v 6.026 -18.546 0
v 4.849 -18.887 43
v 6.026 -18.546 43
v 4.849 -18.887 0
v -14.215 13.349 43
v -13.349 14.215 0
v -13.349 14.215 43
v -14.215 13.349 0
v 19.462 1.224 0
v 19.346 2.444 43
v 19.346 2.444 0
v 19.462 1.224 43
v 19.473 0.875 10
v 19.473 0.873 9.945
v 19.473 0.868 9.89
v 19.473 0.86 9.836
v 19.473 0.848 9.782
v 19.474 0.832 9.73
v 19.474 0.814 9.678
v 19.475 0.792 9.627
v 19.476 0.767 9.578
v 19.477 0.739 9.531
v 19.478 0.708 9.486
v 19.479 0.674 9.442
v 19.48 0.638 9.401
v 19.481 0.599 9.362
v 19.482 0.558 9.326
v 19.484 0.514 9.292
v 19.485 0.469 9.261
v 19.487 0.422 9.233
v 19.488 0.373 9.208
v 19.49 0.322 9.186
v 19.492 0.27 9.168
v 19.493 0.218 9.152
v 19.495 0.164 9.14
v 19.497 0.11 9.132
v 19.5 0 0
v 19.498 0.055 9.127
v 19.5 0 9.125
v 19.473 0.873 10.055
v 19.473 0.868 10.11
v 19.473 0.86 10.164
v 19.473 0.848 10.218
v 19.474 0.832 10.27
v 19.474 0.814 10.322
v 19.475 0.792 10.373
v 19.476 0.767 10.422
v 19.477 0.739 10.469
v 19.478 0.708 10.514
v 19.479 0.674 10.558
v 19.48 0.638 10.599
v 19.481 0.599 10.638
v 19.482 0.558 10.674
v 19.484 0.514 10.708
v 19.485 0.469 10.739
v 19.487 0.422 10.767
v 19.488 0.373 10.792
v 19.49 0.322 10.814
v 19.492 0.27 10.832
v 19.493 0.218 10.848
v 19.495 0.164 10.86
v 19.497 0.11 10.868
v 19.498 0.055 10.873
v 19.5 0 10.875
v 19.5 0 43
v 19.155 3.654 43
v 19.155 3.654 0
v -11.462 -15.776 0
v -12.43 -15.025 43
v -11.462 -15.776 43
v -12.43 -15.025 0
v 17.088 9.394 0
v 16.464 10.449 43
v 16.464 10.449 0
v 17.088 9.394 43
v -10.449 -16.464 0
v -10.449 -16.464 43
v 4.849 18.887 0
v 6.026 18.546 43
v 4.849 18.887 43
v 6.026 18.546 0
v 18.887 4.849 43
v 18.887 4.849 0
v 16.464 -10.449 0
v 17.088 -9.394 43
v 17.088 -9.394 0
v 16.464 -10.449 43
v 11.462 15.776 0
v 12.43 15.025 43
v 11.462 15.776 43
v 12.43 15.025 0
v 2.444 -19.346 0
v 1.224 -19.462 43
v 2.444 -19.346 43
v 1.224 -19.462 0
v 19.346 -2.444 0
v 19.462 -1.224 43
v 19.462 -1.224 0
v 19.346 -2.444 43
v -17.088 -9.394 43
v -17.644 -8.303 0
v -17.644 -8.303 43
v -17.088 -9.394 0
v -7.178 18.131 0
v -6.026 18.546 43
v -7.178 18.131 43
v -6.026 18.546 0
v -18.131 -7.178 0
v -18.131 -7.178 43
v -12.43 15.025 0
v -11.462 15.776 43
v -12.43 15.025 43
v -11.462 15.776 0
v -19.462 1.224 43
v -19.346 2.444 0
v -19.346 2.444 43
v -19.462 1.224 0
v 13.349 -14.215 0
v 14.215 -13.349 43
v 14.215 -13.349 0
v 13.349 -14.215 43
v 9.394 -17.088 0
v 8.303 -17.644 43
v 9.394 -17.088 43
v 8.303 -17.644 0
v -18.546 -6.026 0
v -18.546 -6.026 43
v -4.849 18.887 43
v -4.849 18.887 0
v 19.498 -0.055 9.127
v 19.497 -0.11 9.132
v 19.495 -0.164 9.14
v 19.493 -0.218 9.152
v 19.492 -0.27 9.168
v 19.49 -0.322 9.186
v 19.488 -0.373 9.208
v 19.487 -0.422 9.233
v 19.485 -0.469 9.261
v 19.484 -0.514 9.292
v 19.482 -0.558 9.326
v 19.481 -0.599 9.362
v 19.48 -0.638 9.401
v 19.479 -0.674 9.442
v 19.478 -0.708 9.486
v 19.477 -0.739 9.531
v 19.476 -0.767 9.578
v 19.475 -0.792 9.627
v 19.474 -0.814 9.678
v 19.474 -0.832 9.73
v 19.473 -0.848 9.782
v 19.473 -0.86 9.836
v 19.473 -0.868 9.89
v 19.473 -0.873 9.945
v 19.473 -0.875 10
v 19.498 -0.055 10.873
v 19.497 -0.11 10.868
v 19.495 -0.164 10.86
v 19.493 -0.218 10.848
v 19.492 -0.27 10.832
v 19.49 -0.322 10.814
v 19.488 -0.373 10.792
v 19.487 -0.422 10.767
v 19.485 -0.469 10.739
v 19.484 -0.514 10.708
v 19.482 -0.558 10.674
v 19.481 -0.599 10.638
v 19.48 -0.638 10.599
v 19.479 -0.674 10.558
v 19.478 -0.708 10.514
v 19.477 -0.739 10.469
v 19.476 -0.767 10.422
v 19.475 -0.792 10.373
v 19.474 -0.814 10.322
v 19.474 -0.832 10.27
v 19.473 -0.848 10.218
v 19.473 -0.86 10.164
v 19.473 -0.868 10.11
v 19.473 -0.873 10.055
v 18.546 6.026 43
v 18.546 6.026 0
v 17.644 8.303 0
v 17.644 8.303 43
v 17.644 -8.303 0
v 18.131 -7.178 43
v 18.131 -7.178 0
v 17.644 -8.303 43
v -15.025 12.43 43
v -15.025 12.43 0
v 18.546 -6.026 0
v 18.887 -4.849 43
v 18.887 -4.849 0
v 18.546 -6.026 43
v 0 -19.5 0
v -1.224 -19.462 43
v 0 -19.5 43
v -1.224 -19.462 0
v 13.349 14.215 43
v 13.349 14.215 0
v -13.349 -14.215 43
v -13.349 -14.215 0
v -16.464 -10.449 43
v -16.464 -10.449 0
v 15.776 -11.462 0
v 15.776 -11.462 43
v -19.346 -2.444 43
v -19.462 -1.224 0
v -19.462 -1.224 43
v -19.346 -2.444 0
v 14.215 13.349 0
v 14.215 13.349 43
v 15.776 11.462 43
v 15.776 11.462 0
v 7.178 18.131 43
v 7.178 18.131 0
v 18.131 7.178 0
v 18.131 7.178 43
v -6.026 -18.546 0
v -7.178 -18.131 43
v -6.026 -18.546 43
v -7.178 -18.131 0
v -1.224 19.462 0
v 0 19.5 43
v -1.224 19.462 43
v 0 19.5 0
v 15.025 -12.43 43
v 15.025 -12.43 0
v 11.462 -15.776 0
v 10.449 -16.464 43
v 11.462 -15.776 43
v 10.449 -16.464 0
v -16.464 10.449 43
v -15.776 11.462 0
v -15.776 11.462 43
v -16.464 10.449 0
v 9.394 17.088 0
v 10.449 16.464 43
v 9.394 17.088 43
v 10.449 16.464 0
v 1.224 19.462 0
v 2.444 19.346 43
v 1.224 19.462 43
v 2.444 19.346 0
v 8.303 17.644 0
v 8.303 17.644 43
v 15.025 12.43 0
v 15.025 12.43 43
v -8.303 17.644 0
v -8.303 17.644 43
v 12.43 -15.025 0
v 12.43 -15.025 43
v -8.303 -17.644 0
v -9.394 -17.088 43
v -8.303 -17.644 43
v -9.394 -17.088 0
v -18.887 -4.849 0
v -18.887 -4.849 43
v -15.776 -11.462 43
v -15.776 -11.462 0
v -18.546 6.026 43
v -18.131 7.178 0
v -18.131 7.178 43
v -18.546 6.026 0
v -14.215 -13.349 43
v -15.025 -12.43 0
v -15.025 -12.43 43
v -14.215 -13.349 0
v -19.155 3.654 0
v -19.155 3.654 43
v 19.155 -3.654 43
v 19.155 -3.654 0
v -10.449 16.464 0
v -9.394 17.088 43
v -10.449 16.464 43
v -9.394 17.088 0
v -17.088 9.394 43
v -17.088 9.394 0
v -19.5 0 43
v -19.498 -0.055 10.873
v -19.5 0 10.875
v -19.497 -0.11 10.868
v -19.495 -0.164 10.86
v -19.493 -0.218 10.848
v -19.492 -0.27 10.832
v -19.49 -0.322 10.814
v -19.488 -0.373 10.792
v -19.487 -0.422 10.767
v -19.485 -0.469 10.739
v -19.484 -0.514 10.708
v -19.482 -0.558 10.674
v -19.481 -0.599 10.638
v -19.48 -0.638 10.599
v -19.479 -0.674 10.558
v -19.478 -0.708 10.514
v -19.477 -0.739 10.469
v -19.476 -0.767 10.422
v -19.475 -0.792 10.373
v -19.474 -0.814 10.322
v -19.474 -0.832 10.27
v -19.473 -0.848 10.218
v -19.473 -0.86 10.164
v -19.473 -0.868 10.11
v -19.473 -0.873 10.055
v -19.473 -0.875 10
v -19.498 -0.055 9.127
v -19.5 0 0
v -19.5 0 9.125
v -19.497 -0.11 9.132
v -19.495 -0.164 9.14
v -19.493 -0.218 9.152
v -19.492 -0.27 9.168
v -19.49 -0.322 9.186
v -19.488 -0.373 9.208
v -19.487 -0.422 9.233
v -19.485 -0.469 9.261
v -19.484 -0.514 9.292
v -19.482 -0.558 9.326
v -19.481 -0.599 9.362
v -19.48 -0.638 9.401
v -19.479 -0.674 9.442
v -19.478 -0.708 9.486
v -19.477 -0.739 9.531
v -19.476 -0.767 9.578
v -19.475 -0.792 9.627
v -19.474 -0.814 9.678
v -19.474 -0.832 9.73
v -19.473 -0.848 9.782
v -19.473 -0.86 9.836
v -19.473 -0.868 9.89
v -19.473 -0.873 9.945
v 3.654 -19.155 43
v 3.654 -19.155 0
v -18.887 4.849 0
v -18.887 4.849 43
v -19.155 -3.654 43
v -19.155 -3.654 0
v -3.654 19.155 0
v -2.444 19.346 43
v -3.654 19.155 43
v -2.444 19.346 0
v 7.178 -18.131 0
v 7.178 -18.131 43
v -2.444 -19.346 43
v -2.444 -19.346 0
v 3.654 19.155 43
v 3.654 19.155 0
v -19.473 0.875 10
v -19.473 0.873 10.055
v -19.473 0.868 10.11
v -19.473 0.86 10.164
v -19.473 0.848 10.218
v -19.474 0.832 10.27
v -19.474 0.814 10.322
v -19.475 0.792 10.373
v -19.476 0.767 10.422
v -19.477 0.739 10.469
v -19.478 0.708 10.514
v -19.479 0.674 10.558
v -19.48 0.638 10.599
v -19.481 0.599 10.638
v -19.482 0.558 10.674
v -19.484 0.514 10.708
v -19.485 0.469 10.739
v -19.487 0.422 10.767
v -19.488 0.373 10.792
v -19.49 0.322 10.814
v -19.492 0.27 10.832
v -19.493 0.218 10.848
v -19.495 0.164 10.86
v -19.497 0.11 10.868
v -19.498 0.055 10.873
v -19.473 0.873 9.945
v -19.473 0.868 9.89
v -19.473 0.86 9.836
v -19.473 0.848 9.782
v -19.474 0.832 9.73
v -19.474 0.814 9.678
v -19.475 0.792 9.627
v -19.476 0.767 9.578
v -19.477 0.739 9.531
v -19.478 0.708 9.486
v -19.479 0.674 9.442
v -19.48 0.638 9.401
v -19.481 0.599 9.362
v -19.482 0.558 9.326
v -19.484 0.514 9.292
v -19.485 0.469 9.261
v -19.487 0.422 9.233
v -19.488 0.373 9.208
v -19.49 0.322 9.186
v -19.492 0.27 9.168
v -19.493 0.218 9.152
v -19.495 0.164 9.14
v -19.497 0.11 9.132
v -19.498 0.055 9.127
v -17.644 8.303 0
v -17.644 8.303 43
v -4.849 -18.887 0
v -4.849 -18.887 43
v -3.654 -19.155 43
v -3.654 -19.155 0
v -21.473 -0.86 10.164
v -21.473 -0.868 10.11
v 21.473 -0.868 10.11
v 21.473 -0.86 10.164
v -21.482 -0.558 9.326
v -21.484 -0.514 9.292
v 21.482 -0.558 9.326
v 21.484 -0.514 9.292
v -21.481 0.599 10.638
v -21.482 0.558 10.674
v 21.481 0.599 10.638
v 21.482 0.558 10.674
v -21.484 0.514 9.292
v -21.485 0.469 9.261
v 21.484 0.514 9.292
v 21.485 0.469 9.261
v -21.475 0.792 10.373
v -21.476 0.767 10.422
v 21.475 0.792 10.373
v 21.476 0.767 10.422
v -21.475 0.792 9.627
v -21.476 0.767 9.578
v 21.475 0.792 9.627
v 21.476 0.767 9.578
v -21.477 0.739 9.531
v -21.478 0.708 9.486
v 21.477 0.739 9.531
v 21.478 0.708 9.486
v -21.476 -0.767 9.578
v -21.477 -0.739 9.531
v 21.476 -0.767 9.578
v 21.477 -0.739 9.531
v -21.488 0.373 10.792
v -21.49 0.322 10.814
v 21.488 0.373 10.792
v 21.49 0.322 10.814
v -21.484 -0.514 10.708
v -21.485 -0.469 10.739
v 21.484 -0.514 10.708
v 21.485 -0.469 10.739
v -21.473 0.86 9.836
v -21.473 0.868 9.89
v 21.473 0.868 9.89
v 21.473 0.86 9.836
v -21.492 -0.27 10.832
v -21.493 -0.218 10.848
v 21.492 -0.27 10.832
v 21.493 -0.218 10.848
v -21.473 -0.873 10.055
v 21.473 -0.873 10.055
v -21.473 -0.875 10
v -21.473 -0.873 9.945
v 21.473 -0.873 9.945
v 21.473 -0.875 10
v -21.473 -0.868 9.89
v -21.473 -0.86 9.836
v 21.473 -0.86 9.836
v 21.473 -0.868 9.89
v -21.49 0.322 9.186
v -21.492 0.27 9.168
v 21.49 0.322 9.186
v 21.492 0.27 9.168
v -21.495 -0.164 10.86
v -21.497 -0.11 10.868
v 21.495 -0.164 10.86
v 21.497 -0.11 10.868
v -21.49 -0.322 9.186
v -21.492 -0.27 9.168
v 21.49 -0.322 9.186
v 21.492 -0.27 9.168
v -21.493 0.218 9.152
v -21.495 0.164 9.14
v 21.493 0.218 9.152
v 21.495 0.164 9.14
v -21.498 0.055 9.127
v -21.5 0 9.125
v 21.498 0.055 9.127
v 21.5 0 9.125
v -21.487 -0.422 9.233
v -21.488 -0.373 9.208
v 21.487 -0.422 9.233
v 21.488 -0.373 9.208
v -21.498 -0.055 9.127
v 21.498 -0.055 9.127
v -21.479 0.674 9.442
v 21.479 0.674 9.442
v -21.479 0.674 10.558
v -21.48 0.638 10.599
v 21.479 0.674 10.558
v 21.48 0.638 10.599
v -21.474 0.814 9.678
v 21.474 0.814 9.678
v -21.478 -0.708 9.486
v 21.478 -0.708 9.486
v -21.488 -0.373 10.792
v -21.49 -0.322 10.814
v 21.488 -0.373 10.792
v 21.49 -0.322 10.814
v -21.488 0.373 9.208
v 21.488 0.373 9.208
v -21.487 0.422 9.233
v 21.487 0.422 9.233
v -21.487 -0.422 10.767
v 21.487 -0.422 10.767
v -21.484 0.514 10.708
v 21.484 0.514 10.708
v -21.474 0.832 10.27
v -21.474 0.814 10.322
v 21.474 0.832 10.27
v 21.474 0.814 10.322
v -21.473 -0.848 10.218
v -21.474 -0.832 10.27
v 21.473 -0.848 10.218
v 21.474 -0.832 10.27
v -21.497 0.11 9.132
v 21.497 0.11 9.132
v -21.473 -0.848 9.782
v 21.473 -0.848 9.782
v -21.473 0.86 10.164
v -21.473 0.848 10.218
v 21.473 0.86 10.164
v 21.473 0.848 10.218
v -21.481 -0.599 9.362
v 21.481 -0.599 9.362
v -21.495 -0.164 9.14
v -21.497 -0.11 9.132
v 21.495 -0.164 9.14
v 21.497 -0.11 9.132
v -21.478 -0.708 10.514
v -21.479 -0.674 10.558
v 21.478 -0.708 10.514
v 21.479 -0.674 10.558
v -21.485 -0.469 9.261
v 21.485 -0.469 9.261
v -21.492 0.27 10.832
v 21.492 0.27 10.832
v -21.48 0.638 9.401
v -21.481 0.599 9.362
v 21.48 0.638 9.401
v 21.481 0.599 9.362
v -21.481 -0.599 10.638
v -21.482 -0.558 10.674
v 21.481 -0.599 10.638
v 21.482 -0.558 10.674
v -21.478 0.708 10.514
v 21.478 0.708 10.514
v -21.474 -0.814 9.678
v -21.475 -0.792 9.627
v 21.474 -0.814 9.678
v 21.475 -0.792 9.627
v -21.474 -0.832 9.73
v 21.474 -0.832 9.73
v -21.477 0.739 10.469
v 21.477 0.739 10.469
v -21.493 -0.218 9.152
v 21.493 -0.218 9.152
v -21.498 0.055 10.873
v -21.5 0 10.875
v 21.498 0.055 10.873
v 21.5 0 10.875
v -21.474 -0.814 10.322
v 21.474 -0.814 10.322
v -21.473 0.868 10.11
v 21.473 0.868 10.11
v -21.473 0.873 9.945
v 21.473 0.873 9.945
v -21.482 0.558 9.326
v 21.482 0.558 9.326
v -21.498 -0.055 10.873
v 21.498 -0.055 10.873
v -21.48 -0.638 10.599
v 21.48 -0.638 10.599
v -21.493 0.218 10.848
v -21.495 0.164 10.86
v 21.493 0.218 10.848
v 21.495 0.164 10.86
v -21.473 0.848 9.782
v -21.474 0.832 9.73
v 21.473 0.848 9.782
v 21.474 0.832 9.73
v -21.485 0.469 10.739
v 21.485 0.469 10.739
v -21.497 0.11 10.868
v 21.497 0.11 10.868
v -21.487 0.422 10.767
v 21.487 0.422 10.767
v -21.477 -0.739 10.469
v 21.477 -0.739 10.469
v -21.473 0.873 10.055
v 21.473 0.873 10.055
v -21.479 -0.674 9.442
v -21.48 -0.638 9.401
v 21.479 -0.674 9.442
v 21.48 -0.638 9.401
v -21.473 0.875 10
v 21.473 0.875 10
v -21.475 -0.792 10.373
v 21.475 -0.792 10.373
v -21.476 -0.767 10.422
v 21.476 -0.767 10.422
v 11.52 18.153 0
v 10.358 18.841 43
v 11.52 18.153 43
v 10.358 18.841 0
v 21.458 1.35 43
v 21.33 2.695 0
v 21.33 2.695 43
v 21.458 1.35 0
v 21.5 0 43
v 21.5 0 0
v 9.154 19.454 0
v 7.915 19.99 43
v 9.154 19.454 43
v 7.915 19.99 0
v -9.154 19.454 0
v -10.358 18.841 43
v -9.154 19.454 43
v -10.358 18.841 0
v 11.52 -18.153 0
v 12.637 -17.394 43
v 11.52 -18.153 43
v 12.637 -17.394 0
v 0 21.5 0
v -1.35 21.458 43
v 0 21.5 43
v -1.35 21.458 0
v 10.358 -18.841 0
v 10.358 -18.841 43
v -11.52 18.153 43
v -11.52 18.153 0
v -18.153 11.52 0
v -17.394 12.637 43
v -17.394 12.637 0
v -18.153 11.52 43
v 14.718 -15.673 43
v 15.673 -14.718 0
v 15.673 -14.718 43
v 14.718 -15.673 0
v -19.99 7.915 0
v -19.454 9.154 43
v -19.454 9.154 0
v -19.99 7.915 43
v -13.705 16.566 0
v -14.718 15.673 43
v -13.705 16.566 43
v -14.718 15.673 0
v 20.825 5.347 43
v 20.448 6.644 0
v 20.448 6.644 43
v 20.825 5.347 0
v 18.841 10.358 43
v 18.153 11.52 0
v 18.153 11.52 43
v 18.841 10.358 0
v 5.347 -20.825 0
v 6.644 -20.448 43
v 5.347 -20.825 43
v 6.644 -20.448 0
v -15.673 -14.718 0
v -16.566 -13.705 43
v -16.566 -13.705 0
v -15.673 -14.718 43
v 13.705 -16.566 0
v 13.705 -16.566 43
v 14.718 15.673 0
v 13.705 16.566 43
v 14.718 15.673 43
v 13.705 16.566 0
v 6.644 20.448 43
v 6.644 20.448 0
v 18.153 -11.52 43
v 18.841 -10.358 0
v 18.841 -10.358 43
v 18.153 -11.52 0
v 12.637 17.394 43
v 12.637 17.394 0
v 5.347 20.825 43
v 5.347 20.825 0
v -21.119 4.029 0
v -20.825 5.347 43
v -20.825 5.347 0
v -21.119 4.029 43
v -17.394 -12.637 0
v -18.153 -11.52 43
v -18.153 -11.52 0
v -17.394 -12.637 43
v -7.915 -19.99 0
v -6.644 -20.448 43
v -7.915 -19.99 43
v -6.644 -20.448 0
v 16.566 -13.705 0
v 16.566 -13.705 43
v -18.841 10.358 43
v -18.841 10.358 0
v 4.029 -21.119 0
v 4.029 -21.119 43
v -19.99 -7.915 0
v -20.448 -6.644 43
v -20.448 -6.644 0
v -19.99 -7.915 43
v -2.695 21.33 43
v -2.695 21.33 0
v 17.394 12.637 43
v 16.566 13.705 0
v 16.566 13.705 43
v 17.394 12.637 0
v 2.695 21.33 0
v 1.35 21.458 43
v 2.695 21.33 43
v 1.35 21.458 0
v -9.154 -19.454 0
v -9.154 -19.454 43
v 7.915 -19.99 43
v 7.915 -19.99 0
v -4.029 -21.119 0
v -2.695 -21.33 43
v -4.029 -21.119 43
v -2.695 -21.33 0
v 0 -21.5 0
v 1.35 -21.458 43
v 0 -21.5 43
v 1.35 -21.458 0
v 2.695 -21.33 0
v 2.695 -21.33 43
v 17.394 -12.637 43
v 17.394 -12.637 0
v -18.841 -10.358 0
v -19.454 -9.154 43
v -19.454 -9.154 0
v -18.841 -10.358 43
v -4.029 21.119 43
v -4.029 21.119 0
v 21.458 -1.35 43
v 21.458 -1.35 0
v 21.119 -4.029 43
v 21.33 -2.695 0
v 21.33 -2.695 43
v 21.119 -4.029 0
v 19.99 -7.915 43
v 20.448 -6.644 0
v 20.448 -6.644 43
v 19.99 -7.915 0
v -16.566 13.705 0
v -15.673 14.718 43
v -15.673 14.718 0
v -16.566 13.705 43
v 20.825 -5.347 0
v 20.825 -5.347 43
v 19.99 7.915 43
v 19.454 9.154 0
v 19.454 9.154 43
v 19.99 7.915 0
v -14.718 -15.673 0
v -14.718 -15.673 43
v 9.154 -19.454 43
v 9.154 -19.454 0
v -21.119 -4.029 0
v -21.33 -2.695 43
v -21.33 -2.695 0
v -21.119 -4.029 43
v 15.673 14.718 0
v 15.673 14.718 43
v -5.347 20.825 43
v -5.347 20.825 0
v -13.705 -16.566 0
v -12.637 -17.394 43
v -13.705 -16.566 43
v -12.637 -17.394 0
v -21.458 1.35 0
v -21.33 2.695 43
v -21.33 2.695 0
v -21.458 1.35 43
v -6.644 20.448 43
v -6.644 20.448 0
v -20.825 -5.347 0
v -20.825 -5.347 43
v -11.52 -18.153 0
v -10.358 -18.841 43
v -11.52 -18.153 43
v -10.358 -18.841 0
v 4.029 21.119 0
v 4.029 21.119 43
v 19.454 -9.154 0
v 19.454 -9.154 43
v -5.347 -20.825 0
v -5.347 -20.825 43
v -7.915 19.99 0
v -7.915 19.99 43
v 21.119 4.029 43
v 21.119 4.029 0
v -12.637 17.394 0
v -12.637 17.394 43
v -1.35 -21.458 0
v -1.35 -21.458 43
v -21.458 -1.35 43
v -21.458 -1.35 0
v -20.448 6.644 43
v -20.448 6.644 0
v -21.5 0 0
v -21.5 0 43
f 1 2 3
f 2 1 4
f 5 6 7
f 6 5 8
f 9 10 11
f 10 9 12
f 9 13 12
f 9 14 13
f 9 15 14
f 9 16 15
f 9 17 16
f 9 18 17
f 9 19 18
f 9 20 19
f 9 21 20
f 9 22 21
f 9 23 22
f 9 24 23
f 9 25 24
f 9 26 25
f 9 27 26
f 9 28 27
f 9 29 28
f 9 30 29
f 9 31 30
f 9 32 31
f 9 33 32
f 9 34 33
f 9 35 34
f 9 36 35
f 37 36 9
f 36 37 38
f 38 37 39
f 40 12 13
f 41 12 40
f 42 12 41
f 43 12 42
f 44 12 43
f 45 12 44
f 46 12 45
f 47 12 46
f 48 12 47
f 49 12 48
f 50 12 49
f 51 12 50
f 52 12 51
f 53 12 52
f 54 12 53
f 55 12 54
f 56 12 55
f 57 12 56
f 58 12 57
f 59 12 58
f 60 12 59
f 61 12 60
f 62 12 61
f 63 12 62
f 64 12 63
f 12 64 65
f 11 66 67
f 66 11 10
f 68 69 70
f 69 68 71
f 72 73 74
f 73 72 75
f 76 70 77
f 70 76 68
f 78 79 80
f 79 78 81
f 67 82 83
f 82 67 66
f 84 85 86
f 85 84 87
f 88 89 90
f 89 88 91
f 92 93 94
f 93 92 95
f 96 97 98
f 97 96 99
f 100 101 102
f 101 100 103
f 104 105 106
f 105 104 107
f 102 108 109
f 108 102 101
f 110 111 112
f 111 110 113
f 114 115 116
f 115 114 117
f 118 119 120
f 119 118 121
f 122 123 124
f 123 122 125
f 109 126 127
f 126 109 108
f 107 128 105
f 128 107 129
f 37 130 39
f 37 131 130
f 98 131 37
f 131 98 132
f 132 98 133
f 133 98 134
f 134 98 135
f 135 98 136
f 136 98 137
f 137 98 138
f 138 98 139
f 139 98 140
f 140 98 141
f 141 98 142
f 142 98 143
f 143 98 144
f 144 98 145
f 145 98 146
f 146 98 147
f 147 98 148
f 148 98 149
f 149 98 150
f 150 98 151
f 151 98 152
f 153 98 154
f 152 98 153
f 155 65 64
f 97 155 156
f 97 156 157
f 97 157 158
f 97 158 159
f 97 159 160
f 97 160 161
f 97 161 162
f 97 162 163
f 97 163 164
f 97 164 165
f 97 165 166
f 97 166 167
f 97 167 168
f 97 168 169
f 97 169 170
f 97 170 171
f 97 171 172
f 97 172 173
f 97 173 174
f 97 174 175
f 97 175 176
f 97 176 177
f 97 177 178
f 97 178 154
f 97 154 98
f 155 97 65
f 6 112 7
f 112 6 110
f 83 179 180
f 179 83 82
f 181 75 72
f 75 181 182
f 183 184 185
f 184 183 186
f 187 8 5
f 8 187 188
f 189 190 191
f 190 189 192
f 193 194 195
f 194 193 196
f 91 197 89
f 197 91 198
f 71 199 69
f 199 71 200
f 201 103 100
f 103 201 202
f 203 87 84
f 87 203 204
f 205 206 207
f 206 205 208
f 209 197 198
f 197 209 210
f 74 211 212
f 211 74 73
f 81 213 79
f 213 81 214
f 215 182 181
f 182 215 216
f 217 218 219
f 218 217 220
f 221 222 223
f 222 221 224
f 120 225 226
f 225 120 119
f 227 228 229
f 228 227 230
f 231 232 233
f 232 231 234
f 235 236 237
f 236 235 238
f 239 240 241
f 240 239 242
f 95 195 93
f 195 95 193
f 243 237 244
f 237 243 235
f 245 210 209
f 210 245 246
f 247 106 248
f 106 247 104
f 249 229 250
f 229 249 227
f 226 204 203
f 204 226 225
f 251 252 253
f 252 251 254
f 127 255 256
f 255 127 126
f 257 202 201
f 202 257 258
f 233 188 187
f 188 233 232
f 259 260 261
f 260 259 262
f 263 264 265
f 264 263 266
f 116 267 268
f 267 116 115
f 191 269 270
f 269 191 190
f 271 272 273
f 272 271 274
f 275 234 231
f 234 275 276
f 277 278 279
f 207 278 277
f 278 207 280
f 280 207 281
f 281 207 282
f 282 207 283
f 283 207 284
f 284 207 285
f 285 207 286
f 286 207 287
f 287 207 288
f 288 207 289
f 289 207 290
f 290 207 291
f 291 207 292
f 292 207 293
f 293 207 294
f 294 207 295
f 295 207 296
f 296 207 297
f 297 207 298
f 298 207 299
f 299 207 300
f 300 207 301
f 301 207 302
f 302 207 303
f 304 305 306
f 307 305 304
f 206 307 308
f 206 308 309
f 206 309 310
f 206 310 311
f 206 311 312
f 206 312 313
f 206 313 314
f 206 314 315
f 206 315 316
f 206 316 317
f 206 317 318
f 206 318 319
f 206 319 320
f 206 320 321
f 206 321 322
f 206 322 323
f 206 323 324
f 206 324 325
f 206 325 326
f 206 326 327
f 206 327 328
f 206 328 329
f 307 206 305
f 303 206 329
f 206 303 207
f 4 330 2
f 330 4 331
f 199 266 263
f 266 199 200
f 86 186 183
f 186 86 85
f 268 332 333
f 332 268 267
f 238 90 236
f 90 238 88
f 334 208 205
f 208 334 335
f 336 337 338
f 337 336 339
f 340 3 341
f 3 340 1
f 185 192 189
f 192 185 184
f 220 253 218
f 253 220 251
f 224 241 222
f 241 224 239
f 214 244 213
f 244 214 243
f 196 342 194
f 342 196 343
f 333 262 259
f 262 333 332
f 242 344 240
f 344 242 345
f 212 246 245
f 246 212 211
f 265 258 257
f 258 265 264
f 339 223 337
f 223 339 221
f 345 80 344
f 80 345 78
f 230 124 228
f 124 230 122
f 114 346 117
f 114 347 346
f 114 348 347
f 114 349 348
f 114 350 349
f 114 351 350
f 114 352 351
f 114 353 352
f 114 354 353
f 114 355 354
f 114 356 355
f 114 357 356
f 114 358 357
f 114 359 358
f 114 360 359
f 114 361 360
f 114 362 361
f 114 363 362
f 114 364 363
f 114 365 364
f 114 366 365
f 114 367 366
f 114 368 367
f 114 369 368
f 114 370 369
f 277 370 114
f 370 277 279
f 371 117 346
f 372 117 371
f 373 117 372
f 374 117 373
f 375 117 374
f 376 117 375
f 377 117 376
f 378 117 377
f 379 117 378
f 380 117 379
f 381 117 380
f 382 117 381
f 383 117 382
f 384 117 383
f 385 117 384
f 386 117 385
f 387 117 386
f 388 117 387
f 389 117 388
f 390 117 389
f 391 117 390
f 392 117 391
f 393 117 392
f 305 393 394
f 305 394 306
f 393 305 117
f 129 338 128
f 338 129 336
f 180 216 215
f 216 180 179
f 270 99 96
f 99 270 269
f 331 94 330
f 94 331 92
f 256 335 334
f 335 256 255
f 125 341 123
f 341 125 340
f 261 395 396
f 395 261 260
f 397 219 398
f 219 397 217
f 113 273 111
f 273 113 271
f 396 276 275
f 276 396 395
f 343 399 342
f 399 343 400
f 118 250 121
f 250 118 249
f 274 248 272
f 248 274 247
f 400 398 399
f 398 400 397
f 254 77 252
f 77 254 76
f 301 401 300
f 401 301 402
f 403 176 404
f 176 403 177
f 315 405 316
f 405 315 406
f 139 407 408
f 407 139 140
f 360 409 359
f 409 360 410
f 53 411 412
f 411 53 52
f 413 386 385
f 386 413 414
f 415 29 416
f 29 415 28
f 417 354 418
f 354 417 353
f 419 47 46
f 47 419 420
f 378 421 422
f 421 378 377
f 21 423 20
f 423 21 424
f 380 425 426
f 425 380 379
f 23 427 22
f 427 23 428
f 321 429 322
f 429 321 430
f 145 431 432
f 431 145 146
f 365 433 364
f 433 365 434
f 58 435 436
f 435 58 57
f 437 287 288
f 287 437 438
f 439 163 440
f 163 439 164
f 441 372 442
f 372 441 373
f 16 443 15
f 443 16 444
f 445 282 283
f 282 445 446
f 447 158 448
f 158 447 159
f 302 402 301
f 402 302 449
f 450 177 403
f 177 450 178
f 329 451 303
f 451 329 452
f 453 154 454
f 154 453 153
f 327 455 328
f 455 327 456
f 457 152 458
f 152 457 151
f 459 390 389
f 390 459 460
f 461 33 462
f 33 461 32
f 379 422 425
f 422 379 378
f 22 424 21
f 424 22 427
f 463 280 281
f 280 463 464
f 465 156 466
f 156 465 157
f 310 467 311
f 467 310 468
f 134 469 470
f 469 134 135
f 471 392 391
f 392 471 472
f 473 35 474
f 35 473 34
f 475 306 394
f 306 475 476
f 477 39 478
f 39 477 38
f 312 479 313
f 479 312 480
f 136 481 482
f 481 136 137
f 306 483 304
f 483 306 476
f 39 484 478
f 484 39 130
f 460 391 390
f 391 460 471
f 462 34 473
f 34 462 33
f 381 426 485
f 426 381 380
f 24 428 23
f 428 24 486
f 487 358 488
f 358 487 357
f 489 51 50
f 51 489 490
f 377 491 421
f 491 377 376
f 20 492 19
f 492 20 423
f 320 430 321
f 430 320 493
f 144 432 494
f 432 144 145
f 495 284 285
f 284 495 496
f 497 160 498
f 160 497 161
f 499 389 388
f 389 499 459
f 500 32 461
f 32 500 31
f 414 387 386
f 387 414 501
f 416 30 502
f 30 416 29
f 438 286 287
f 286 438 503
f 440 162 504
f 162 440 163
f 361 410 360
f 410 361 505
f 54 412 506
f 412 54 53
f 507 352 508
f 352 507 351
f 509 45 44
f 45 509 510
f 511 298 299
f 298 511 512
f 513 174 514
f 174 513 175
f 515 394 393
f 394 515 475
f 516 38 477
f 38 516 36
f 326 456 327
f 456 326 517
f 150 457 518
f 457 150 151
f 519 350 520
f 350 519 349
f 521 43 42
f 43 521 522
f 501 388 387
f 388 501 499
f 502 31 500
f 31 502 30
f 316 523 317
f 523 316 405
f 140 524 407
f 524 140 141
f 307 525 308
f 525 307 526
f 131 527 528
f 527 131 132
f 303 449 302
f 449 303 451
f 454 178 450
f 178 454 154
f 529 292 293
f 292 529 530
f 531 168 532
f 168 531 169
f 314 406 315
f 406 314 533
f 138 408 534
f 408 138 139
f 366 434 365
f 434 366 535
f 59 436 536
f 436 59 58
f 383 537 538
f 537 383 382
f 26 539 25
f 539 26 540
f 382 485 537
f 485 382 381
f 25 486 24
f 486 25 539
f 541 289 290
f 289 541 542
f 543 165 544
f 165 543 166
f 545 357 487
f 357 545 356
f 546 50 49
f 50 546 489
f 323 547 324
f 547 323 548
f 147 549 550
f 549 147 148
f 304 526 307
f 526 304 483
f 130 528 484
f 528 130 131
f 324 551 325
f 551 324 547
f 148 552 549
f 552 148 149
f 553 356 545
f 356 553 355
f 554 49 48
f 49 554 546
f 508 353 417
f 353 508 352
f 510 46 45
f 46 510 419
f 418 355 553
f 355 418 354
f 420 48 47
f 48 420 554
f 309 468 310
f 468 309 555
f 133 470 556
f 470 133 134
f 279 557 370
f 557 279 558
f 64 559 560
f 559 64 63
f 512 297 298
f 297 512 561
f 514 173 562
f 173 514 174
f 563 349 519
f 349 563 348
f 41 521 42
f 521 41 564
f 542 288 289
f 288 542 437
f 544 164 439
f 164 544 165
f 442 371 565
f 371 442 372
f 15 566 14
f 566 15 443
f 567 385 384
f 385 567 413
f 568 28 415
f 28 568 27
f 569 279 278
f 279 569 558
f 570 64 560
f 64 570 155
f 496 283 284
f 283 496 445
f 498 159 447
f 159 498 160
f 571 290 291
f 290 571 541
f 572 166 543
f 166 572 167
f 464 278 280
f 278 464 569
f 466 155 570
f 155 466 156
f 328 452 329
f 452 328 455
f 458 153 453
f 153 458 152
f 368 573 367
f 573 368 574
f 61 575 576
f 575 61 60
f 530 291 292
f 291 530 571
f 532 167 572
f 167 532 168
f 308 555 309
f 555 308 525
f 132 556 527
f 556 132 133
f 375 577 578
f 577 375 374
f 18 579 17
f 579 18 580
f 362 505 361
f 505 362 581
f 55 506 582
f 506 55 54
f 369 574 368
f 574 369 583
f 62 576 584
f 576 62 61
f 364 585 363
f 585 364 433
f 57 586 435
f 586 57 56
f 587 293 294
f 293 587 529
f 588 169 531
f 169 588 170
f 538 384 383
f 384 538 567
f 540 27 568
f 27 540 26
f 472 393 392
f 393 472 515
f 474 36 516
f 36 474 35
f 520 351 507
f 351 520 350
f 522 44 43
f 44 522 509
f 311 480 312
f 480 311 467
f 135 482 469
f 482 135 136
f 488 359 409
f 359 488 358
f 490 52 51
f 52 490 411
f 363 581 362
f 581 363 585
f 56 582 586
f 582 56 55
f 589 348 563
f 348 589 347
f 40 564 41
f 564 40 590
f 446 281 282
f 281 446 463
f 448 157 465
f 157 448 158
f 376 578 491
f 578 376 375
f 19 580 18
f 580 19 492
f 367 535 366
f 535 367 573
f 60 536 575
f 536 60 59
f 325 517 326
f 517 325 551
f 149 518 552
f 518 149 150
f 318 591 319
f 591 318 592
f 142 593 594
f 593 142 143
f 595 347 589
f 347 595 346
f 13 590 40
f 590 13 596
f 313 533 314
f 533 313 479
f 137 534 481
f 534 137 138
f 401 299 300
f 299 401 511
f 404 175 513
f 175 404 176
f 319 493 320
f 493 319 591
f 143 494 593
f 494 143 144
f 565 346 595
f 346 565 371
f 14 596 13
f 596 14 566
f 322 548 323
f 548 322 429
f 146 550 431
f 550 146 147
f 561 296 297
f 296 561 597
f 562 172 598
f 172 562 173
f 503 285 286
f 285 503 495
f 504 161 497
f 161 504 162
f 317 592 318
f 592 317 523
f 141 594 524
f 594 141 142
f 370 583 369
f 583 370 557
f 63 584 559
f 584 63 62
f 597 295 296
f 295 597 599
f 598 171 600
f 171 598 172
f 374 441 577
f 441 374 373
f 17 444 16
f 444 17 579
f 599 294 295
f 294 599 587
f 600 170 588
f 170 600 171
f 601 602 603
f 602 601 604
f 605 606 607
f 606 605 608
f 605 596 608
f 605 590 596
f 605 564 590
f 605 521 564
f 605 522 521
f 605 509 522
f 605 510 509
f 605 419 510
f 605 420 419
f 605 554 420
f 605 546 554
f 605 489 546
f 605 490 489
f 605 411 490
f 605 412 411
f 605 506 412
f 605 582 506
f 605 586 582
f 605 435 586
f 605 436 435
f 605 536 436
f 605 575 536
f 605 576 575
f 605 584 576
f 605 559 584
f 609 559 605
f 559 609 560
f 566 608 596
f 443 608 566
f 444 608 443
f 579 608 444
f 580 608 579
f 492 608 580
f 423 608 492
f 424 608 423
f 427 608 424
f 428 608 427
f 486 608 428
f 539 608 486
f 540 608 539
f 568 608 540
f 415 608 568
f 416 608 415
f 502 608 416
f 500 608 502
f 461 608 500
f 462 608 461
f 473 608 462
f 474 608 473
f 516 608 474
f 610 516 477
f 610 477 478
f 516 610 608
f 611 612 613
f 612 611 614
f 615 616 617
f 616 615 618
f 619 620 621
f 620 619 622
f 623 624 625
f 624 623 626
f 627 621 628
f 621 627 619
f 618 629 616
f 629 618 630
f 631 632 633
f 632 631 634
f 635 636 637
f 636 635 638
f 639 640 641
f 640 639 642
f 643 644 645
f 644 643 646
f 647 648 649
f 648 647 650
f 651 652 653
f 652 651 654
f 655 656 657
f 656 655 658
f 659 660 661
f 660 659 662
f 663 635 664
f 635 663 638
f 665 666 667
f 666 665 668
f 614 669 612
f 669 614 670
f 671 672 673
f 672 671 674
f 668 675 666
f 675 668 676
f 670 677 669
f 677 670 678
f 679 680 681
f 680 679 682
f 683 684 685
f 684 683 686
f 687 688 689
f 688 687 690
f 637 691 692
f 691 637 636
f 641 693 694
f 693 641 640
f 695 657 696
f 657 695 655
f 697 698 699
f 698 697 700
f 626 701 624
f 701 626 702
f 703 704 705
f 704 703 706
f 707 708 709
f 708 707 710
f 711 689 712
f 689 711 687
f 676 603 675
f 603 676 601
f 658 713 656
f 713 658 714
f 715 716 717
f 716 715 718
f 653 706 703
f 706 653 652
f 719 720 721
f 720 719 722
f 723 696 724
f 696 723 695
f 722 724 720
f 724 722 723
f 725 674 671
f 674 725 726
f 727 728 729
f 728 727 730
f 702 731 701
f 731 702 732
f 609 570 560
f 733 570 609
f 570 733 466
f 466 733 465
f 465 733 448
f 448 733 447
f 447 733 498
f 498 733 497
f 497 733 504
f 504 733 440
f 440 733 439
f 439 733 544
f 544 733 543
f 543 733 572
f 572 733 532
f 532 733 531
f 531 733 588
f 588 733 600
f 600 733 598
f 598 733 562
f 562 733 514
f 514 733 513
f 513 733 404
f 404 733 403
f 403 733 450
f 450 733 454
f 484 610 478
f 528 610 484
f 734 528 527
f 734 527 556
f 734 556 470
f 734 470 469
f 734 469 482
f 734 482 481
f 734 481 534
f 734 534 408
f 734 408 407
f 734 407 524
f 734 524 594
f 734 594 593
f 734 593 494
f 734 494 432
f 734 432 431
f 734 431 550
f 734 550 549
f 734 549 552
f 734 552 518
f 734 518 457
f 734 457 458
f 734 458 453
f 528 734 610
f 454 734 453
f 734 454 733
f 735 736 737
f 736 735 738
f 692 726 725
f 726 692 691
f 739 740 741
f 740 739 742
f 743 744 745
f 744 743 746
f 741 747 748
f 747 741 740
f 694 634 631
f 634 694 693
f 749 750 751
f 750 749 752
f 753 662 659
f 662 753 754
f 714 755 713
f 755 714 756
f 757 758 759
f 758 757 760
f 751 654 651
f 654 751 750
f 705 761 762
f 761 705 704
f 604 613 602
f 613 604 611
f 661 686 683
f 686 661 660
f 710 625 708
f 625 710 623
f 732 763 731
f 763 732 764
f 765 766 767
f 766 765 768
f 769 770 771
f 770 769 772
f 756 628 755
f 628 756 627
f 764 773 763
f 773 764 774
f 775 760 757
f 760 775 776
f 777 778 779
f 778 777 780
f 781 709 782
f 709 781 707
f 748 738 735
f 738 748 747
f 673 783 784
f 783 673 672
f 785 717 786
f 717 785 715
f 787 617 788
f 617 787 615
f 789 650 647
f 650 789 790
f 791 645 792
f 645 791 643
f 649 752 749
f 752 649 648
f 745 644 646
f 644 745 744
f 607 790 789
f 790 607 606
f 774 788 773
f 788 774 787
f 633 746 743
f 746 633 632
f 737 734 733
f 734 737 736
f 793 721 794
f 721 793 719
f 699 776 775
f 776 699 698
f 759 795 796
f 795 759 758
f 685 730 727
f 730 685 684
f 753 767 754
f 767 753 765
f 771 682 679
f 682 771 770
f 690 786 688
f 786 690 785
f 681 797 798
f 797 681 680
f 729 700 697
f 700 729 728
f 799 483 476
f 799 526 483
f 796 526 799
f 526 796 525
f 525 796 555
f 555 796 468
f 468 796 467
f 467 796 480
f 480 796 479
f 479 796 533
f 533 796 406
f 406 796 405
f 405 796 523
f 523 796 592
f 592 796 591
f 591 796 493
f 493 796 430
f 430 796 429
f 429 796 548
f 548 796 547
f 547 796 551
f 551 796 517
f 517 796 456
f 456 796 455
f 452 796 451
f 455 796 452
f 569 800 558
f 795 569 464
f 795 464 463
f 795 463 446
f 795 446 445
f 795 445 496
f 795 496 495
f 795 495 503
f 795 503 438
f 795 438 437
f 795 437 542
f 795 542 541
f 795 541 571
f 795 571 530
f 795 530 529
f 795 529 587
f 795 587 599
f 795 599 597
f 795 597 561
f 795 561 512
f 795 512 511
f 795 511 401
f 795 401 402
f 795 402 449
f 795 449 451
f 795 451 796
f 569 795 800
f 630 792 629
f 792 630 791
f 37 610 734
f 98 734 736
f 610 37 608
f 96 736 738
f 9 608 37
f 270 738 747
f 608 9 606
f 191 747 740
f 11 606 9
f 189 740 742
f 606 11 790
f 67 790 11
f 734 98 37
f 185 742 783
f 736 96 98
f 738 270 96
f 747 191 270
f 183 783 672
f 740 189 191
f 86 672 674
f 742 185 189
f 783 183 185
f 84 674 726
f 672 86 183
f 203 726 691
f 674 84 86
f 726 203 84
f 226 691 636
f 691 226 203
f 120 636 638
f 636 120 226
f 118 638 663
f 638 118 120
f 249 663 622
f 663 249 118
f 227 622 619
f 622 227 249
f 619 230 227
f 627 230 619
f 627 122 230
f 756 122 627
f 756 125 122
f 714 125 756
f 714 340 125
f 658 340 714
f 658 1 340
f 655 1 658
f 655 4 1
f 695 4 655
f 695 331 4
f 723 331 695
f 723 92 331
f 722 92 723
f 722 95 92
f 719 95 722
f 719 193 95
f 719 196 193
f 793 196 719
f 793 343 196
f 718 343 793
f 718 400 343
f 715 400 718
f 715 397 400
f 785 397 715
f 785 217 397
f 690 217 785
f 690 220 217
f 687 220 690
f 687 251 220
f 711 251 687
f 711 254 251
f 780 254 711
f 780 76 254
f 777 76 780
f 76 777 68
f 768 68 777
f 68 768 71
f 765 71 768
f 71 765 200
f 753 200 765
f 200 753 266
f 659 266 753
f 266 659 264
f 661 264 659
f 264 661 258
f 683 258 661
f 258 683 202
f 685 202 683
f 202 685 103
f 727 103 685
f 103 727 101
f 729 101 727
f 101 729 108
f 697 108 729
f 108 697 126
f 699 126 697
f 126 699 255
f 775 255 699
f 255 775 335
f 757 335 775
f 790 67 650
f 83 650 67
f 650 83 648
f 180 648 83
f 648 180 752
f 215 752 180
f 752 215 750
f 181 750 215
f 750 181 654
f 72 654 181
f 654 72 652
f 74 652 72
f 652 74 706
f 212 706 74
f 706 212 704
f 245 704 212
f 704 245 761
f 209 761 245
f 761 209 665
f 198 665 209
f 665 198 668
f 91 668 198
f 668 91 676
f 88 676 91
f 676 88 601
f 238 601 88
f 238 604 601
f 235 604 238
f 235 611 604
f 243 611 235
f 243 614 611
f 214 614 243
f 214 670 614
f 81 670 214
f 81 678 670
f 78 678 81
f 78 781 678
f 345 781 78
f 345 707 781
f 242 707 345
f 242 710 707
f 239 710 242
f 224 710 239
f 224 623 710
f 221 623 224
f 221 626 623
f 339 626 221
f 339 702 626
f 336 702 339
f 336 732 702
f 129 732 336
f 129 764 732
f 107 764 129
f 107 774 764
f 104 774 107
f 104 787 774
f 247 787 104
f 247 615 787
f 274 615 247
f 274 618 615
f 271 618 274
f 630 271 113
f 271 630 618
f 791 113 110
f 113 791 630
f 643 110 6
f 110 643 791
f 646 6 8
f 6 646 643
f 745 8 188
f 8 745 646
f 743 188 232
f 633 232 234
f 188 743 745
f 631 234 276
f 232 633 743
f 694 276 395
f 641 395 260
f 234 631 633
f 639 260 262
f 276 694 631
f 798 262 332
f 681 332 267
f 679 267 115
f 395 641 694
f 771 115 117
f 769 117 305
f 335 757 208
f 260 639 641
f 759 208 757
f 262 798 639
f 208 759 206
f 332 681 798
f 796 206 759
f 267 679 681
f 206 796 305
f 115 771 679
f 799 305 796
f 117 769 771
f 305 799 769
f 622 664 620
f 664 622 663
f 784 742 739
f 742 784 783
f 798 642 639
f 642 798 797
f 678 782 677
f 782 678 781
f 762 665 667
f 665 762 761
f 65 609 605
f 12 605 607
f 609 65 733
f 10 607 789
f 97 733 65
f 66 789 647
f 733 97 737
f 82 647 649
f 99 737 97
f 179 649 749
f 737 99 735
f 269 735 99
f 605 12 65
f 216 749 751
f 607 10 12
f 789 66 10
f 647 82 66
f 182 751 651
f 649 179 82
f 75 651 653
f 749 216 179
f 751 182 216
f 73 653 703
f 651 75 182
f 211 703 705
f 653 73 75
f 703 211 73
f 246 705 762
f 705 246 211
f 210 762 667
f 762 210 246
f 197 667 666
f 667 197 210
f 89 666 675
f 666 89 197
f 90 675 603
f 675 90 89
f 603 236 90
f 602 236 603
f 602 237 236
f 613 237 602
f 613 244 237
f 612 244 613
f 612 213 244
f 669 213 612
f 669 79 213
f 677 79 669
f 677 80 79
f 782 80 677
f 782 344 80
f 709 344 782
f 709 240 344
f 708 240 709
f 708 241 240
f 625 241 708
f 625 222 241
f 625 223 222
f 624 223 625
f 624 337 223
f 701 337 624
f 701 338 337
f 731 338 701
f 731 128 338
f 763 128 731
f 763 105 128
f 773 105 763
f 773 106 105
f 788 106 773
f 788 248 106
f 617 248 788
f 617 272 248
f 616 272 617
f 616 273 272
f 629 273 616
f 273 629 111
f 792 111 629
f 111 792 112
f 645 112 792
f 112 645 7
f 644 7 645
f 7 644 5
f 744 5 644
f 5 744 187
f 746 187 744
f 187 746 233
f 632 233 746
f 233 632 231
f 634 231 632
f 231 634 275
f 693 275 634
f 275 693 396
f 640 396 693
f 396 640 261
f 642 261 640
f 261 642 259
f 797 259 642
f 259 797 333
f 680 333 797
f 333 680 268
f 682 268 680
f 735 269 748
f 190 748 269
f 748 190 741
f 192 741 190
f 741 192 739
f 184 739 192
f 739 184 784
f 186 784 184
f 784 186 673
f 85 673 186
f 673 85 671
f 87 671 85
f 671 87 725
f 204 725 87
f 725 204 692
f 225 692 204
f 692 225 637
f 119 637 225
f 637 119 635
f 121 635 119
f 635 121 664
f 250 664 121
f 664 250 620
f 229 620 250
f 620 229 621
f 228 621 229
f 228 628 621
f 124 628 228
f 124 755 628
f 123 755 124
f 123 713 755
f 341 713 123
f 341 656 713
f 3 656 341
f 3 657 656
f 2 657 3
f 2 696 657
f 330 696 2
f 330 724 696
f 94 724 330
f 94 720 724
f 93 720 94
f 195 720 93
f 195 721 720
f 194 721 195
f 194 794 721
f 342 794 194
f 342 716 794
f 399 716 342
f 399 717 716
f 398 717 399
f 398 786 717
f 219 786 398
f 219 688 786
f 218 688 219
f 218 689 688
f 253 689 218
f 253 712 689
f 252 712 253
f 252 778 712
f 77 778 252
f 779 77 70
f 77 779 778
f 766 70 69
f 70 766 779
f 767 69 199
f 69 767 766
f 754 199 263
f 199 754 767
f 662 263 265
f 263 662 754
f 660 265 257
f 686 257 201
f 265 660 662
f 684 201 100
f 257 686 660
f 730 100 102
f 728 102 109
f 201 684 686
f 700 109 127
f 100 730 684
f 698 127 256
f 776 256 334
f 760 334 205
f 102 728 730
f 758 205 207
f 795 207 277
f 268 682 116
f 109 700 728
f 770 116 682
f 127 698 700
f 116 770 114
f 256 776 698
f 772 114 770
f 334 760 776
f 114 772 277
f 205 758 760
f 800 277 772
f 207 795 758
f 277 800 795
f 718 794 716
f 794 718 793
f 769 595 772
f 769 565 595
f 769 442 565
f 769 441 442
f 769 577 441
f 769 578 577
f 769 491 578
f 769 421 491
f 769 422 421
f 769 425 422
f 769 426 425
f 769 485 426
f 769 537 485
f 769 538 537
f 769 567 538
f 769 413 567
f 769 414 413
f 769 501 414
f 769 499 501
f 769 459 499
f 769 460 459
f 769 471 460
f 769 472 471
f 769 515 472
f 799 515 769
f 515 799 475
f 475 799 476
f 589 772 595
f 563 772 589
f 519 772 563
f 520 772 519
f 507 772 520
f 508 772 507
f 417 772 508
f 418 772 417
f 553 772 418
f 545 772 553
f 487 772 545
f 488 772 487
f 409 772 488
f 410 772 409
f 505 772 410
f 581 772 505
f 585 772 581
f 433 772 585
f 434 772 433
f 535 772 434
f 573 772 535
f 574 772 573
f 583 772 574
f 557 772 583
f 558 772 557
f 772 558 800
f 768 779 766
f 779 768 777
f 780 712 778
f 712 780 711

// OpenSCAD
//Glasses Professor Farnsworth
$fn = 100; 
d = 1.75;//shackle diameter
hd = 10;//height of mounting arch
difference(){     
cylinder(h=43,r=43/2,r2=43/2);
union(){
translate(v=[0,0,-3/2])
cylinder(h=50,r=39/2,r2=39/2);
 translate(v=[0,0,hd])rotate([0, 90, 0 ])cylinder(100,d/2,d/2,center = true);   
    
}}
